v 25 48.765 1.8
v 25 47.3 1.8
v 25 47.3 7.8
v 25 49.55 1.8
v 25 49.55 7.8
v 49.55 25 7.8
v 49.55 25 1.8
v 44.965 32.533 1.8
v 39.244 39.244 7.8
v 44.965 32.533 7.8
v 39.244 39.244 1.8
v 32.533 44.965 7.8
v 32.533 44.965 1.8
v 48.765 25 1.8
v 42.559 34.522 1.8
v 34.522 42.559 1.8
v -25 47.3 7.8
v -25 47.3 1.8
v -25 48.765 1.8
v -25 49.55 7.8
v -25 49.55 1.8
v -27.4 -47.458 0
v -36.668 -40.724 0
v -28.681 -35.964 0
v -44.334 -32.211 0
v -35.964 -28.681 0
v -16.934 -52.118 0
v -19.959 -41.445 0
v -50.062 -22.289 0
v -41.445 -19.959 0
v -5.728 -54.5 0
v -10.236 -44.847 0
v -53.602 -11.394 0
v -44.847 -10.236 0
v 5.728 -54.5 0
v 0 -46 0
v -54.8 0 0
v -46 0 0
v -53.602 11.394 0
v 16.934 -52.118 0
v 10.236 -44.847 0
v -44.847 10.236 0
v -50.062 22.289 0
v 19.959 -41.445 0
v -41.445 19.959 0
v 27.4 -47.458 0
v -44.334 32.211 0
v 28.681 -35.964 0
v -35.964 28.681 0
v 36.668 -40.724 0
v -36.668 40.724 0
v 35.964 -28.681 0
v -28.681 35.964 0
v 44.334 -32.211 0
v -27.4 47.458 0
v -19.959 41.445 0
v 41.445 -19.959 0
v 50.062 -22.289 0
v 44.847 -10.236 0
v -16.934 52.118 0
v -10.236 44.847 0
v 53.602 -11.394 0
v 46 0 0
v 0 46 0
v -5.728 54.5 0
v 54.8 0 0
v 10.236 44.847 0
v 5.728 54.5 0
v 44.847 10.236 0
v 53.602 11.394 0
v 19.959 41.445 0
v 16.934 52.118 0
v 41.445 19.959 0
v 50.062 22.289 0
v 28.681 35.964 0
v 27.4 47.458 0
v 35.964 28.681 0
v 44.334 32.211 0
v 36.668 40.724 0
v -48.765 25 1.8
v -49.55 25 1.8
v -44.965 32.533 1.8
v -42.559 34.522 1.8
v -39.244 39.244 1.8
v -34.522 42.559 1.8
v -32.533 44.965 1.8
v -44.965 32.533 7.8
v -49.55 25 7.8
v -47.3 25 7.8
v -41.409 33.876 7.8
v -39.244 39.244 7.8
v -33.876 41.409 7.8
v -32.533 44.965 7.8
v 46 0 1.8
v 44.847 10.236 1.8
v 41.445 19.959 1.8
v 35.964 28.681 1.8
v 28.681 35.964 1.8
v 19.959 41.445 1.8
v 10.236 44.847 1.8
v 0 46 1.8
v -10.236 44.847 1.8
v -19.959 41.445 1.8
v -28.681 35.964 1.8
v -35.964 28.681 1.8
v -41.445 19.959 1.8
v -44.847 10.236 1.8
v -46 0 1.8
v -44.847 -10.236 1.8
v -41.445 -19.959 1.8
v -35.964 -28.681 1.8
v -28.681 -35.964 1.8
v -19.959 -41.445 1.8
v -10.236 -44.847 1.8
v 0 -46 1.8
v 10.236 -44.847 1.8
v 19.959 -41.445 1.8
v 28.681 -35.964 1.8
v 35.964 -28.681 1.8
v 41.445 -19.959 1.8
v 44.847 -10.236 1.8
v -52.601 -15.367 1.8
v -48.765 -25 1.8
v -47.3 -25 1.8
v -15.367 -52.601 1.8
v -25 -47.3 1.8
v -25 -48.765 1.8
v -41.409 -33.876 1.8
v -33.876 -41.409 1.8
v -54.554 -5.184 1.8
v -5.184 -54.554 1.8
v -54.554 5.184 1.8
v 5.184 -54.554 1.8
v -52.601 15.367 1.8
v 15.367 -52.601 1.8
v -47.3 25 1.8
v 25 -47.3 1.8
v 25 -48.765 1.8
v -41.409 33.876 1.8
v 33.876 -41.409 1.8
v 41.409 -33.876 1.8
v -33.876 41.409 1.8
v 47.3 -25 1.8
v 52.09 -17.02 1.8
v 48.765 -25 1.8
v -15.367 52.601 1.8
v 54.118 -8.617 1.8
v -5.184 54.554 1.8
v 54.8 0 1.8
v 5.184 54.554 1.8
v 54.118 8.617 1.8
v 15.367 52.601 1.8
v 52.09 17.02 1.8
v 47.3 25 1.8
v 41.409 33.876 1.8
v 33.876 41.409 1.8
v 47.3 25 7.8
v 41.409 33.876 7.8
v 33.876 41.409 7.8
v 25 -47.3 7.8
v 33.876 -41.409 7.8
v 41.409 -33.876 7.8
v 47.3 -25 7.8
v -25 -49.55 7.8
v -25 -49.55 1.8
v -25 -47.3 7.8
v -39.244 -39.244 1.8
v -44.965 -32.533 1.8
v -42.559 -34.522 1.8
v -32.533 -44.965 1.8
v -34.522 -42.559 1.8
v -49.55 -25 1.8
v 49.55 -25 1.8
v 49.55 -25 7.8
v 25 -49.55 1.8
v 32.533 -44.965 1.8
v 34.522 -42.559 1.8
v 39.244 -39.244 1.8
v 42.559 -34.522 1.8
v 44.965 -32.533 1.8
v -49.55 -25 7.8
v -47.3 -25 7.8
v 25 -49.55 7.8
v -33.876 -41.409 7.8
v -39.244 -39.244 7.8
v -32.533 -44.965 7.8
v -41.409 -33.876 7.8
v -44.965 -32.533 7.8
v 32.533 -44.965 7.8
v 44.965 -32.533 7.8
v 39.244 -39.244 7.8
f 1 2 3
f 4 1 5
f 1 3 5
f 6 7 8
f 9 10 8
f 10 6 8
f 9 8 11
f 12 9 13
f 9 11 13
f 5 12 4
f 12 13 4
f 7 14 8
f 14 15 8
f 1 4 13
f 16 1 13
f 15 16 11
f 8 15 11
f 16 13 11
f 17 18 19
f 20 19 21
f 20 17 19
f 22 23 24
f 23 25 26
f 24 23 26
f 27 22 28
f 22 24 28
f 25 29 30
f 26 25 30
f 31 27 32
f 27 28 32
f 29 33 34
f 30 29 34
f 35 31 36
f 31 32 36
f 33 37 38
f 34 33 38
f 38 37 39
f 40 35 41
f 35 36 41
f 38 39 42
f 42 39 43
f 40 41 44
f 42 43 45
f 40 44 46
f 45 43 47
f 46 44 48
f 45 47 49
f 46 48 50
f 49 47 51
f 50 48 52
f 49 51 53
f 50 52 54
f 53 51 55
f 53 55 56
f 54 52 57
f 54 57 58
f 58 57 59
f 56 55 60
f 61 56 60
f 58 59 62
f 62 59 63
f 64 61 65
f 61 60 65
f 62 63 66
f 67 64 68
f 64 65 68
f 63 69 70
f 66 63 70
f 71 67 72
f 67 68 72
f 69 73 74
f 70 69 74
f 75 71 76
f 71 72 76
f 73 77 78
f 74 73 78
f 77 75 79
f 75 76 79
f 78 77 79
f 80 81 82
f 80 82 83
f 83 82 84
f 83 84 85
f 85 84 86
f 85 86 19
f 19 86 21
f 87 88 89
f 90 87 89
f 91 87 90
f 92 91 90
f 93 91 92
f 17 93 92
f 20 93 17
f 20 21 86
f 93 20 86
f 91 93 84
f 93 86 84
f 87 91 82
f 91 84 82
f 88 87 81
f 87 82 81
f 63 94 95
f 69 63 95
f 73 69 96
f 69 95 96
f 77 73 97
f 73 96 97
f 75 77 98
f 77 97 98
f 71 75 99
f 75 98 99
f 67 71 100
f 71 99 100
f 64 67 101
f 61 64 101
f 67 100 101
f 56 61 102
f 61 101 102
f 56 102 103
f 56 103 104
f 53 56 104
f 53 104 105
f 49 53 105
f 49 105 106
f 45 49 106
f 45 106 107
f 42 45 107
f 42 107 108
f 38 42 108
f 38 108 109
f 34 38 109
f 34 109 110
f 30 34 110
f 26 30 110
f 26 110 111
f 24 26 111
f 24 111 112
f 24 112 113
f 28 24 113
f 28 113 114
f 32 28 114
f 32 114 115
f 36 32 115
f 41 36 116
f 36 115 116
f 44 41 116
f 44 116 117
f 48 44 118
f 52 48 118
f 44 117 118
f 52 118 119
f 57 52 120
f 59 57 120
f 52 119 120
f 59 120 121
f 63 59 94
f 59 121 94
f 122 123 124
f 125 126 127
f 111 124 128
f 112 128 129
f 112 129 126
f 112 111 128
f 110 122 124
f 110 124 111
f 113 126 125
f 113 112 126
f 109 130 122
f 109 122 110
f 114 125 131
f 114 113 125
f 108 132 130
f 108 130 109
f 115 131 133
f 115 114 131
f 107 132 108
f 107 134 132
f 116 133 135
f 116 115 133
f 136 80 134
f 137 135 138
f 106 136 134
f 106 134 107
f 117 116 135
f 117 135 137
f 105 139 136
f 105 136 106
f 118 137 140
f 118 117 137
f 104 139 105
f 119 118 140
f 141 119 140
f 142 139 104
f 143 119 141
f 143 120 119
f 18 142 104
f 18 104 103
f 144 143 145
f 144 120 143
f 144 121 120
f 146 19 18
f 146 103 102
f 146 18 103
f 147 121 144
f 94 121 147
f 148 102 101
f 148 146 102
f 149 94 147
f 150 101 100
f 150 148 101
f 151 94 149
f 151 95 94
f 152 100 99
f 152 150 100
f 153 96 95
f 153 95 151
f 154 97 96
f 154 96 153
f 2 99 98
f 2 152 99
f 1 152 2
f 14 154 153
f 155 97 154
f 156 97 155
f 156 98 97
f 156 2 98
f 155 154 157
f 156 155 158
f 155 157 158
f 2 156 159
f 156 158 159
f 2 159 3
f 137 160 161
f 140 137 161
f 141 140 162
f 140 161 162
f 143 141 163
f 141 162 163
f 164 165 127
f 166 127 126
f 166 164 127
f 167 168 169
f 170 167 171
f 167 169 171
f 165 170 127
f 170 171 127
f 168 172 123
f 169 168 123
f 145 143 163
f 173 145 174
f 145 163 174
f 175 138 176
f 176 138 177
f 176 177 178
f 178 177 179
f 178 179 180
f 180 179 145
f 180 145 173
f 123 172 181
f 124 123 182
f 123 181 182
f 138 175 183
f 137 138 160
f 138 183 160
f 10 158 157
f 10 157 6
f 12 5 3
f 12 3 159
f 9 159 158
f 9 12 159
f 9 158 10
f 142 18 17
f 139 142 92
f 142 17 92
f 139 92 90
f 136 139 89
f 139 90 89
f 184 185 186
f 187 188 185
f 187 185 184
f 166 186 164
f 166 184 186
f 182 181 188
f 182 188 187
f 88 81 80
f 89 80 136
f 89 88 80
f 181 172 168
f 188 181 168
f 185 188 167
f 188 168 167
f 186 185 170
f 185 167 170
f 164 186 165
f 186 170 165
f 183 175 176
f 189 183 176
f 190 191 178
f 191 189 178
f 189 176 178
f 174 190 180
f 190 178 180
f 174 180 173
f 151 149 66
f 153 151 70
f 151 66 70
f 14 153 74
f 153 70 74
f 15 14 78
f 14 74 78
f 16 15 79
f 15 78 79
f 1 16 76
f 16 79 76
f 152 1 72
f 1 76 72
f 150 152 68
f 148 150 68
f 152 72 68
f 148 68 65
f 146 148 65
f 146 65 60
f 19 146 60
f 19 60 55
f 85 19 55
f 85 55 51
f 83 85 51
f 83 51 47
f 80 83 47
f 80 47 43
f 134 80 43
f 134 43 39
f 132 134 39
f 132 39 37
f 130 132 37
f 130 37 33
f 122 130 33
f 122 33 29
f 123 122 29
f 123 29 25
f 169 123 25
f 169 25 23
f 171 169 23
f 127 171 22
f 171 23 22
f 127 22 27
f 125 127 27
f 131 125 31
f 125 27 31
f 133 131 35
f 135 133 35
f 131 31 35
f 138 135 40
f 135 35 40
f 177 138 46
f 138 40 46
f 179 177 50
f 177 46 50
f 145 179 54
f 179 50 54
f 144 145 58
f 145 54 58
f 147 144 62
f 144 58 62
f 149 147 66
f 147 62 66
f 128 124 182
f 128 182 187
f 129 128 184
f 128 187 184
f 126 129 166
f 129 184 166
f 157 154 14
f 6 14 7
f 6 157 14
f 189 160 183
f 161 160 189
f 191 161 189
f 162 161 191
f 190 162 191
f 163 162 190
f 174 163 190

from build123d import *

# Parameters (mm, degrees)
F0_R      = 54.8
F1_DEPTH  = 1.8
F2_R      = 55.5
F3_DEPTH  = 6
F4_W      = 50
F4_H      = 125
F5_DEPTH  = 6
F6_W      = 120
F6_H      = 50
F7_DEPTH  = 6
F8_R      = 53.5
F9_DEPTH  = 6
F10_R     = 46
F11_DEPTH = 25


with BuildPart() as f1:
    # F0 (on Top) → F1 (new body)
    with BuildSketch(Plane.XY):
        Circle(F0_R)
    extrude(amount=F1_DEPTH)

    # F2 (on face) → F3 (join)
    with BuildSketch(Plane.XY.offset(1.8)):
        Circle(F2_R)
    extrude(amount=F3_DEPTH)

    # F4 (on face) → F5 (cut)
    with BuildSketch(Plane.XY.offset(7.8)):
        Rectangle(F4_W, F4_H)
    extrude(amount=-F5_DEPTH, mode=Mode.SUBTRACT)

    # F6 (on face) → F7 (cut)
    with BuildSketch(Plane.XY.offset(7.8)):
        Rectangle(F6_W, F6_H)
    extrude(amount=-F7_DEPTH, mode=Mode.SUBTRACT)

    # F8 (on face) → F9 (cut)
    with BuildSketch(Plane.XY.offset(7.8)):
        Circle(F8_R)
    extrude(amount=-F9_DEPTH, mode=Mode.SUBTRACT)

    # F10 (on face) → F11 (cut)
    with BuildSketch(Plane.XY.offset(1.8)):
        Circle(F10_R)
    extrude(amount=-F11_DEPTH, mode=Mode.SUBTRACT)


solid = f1.part
